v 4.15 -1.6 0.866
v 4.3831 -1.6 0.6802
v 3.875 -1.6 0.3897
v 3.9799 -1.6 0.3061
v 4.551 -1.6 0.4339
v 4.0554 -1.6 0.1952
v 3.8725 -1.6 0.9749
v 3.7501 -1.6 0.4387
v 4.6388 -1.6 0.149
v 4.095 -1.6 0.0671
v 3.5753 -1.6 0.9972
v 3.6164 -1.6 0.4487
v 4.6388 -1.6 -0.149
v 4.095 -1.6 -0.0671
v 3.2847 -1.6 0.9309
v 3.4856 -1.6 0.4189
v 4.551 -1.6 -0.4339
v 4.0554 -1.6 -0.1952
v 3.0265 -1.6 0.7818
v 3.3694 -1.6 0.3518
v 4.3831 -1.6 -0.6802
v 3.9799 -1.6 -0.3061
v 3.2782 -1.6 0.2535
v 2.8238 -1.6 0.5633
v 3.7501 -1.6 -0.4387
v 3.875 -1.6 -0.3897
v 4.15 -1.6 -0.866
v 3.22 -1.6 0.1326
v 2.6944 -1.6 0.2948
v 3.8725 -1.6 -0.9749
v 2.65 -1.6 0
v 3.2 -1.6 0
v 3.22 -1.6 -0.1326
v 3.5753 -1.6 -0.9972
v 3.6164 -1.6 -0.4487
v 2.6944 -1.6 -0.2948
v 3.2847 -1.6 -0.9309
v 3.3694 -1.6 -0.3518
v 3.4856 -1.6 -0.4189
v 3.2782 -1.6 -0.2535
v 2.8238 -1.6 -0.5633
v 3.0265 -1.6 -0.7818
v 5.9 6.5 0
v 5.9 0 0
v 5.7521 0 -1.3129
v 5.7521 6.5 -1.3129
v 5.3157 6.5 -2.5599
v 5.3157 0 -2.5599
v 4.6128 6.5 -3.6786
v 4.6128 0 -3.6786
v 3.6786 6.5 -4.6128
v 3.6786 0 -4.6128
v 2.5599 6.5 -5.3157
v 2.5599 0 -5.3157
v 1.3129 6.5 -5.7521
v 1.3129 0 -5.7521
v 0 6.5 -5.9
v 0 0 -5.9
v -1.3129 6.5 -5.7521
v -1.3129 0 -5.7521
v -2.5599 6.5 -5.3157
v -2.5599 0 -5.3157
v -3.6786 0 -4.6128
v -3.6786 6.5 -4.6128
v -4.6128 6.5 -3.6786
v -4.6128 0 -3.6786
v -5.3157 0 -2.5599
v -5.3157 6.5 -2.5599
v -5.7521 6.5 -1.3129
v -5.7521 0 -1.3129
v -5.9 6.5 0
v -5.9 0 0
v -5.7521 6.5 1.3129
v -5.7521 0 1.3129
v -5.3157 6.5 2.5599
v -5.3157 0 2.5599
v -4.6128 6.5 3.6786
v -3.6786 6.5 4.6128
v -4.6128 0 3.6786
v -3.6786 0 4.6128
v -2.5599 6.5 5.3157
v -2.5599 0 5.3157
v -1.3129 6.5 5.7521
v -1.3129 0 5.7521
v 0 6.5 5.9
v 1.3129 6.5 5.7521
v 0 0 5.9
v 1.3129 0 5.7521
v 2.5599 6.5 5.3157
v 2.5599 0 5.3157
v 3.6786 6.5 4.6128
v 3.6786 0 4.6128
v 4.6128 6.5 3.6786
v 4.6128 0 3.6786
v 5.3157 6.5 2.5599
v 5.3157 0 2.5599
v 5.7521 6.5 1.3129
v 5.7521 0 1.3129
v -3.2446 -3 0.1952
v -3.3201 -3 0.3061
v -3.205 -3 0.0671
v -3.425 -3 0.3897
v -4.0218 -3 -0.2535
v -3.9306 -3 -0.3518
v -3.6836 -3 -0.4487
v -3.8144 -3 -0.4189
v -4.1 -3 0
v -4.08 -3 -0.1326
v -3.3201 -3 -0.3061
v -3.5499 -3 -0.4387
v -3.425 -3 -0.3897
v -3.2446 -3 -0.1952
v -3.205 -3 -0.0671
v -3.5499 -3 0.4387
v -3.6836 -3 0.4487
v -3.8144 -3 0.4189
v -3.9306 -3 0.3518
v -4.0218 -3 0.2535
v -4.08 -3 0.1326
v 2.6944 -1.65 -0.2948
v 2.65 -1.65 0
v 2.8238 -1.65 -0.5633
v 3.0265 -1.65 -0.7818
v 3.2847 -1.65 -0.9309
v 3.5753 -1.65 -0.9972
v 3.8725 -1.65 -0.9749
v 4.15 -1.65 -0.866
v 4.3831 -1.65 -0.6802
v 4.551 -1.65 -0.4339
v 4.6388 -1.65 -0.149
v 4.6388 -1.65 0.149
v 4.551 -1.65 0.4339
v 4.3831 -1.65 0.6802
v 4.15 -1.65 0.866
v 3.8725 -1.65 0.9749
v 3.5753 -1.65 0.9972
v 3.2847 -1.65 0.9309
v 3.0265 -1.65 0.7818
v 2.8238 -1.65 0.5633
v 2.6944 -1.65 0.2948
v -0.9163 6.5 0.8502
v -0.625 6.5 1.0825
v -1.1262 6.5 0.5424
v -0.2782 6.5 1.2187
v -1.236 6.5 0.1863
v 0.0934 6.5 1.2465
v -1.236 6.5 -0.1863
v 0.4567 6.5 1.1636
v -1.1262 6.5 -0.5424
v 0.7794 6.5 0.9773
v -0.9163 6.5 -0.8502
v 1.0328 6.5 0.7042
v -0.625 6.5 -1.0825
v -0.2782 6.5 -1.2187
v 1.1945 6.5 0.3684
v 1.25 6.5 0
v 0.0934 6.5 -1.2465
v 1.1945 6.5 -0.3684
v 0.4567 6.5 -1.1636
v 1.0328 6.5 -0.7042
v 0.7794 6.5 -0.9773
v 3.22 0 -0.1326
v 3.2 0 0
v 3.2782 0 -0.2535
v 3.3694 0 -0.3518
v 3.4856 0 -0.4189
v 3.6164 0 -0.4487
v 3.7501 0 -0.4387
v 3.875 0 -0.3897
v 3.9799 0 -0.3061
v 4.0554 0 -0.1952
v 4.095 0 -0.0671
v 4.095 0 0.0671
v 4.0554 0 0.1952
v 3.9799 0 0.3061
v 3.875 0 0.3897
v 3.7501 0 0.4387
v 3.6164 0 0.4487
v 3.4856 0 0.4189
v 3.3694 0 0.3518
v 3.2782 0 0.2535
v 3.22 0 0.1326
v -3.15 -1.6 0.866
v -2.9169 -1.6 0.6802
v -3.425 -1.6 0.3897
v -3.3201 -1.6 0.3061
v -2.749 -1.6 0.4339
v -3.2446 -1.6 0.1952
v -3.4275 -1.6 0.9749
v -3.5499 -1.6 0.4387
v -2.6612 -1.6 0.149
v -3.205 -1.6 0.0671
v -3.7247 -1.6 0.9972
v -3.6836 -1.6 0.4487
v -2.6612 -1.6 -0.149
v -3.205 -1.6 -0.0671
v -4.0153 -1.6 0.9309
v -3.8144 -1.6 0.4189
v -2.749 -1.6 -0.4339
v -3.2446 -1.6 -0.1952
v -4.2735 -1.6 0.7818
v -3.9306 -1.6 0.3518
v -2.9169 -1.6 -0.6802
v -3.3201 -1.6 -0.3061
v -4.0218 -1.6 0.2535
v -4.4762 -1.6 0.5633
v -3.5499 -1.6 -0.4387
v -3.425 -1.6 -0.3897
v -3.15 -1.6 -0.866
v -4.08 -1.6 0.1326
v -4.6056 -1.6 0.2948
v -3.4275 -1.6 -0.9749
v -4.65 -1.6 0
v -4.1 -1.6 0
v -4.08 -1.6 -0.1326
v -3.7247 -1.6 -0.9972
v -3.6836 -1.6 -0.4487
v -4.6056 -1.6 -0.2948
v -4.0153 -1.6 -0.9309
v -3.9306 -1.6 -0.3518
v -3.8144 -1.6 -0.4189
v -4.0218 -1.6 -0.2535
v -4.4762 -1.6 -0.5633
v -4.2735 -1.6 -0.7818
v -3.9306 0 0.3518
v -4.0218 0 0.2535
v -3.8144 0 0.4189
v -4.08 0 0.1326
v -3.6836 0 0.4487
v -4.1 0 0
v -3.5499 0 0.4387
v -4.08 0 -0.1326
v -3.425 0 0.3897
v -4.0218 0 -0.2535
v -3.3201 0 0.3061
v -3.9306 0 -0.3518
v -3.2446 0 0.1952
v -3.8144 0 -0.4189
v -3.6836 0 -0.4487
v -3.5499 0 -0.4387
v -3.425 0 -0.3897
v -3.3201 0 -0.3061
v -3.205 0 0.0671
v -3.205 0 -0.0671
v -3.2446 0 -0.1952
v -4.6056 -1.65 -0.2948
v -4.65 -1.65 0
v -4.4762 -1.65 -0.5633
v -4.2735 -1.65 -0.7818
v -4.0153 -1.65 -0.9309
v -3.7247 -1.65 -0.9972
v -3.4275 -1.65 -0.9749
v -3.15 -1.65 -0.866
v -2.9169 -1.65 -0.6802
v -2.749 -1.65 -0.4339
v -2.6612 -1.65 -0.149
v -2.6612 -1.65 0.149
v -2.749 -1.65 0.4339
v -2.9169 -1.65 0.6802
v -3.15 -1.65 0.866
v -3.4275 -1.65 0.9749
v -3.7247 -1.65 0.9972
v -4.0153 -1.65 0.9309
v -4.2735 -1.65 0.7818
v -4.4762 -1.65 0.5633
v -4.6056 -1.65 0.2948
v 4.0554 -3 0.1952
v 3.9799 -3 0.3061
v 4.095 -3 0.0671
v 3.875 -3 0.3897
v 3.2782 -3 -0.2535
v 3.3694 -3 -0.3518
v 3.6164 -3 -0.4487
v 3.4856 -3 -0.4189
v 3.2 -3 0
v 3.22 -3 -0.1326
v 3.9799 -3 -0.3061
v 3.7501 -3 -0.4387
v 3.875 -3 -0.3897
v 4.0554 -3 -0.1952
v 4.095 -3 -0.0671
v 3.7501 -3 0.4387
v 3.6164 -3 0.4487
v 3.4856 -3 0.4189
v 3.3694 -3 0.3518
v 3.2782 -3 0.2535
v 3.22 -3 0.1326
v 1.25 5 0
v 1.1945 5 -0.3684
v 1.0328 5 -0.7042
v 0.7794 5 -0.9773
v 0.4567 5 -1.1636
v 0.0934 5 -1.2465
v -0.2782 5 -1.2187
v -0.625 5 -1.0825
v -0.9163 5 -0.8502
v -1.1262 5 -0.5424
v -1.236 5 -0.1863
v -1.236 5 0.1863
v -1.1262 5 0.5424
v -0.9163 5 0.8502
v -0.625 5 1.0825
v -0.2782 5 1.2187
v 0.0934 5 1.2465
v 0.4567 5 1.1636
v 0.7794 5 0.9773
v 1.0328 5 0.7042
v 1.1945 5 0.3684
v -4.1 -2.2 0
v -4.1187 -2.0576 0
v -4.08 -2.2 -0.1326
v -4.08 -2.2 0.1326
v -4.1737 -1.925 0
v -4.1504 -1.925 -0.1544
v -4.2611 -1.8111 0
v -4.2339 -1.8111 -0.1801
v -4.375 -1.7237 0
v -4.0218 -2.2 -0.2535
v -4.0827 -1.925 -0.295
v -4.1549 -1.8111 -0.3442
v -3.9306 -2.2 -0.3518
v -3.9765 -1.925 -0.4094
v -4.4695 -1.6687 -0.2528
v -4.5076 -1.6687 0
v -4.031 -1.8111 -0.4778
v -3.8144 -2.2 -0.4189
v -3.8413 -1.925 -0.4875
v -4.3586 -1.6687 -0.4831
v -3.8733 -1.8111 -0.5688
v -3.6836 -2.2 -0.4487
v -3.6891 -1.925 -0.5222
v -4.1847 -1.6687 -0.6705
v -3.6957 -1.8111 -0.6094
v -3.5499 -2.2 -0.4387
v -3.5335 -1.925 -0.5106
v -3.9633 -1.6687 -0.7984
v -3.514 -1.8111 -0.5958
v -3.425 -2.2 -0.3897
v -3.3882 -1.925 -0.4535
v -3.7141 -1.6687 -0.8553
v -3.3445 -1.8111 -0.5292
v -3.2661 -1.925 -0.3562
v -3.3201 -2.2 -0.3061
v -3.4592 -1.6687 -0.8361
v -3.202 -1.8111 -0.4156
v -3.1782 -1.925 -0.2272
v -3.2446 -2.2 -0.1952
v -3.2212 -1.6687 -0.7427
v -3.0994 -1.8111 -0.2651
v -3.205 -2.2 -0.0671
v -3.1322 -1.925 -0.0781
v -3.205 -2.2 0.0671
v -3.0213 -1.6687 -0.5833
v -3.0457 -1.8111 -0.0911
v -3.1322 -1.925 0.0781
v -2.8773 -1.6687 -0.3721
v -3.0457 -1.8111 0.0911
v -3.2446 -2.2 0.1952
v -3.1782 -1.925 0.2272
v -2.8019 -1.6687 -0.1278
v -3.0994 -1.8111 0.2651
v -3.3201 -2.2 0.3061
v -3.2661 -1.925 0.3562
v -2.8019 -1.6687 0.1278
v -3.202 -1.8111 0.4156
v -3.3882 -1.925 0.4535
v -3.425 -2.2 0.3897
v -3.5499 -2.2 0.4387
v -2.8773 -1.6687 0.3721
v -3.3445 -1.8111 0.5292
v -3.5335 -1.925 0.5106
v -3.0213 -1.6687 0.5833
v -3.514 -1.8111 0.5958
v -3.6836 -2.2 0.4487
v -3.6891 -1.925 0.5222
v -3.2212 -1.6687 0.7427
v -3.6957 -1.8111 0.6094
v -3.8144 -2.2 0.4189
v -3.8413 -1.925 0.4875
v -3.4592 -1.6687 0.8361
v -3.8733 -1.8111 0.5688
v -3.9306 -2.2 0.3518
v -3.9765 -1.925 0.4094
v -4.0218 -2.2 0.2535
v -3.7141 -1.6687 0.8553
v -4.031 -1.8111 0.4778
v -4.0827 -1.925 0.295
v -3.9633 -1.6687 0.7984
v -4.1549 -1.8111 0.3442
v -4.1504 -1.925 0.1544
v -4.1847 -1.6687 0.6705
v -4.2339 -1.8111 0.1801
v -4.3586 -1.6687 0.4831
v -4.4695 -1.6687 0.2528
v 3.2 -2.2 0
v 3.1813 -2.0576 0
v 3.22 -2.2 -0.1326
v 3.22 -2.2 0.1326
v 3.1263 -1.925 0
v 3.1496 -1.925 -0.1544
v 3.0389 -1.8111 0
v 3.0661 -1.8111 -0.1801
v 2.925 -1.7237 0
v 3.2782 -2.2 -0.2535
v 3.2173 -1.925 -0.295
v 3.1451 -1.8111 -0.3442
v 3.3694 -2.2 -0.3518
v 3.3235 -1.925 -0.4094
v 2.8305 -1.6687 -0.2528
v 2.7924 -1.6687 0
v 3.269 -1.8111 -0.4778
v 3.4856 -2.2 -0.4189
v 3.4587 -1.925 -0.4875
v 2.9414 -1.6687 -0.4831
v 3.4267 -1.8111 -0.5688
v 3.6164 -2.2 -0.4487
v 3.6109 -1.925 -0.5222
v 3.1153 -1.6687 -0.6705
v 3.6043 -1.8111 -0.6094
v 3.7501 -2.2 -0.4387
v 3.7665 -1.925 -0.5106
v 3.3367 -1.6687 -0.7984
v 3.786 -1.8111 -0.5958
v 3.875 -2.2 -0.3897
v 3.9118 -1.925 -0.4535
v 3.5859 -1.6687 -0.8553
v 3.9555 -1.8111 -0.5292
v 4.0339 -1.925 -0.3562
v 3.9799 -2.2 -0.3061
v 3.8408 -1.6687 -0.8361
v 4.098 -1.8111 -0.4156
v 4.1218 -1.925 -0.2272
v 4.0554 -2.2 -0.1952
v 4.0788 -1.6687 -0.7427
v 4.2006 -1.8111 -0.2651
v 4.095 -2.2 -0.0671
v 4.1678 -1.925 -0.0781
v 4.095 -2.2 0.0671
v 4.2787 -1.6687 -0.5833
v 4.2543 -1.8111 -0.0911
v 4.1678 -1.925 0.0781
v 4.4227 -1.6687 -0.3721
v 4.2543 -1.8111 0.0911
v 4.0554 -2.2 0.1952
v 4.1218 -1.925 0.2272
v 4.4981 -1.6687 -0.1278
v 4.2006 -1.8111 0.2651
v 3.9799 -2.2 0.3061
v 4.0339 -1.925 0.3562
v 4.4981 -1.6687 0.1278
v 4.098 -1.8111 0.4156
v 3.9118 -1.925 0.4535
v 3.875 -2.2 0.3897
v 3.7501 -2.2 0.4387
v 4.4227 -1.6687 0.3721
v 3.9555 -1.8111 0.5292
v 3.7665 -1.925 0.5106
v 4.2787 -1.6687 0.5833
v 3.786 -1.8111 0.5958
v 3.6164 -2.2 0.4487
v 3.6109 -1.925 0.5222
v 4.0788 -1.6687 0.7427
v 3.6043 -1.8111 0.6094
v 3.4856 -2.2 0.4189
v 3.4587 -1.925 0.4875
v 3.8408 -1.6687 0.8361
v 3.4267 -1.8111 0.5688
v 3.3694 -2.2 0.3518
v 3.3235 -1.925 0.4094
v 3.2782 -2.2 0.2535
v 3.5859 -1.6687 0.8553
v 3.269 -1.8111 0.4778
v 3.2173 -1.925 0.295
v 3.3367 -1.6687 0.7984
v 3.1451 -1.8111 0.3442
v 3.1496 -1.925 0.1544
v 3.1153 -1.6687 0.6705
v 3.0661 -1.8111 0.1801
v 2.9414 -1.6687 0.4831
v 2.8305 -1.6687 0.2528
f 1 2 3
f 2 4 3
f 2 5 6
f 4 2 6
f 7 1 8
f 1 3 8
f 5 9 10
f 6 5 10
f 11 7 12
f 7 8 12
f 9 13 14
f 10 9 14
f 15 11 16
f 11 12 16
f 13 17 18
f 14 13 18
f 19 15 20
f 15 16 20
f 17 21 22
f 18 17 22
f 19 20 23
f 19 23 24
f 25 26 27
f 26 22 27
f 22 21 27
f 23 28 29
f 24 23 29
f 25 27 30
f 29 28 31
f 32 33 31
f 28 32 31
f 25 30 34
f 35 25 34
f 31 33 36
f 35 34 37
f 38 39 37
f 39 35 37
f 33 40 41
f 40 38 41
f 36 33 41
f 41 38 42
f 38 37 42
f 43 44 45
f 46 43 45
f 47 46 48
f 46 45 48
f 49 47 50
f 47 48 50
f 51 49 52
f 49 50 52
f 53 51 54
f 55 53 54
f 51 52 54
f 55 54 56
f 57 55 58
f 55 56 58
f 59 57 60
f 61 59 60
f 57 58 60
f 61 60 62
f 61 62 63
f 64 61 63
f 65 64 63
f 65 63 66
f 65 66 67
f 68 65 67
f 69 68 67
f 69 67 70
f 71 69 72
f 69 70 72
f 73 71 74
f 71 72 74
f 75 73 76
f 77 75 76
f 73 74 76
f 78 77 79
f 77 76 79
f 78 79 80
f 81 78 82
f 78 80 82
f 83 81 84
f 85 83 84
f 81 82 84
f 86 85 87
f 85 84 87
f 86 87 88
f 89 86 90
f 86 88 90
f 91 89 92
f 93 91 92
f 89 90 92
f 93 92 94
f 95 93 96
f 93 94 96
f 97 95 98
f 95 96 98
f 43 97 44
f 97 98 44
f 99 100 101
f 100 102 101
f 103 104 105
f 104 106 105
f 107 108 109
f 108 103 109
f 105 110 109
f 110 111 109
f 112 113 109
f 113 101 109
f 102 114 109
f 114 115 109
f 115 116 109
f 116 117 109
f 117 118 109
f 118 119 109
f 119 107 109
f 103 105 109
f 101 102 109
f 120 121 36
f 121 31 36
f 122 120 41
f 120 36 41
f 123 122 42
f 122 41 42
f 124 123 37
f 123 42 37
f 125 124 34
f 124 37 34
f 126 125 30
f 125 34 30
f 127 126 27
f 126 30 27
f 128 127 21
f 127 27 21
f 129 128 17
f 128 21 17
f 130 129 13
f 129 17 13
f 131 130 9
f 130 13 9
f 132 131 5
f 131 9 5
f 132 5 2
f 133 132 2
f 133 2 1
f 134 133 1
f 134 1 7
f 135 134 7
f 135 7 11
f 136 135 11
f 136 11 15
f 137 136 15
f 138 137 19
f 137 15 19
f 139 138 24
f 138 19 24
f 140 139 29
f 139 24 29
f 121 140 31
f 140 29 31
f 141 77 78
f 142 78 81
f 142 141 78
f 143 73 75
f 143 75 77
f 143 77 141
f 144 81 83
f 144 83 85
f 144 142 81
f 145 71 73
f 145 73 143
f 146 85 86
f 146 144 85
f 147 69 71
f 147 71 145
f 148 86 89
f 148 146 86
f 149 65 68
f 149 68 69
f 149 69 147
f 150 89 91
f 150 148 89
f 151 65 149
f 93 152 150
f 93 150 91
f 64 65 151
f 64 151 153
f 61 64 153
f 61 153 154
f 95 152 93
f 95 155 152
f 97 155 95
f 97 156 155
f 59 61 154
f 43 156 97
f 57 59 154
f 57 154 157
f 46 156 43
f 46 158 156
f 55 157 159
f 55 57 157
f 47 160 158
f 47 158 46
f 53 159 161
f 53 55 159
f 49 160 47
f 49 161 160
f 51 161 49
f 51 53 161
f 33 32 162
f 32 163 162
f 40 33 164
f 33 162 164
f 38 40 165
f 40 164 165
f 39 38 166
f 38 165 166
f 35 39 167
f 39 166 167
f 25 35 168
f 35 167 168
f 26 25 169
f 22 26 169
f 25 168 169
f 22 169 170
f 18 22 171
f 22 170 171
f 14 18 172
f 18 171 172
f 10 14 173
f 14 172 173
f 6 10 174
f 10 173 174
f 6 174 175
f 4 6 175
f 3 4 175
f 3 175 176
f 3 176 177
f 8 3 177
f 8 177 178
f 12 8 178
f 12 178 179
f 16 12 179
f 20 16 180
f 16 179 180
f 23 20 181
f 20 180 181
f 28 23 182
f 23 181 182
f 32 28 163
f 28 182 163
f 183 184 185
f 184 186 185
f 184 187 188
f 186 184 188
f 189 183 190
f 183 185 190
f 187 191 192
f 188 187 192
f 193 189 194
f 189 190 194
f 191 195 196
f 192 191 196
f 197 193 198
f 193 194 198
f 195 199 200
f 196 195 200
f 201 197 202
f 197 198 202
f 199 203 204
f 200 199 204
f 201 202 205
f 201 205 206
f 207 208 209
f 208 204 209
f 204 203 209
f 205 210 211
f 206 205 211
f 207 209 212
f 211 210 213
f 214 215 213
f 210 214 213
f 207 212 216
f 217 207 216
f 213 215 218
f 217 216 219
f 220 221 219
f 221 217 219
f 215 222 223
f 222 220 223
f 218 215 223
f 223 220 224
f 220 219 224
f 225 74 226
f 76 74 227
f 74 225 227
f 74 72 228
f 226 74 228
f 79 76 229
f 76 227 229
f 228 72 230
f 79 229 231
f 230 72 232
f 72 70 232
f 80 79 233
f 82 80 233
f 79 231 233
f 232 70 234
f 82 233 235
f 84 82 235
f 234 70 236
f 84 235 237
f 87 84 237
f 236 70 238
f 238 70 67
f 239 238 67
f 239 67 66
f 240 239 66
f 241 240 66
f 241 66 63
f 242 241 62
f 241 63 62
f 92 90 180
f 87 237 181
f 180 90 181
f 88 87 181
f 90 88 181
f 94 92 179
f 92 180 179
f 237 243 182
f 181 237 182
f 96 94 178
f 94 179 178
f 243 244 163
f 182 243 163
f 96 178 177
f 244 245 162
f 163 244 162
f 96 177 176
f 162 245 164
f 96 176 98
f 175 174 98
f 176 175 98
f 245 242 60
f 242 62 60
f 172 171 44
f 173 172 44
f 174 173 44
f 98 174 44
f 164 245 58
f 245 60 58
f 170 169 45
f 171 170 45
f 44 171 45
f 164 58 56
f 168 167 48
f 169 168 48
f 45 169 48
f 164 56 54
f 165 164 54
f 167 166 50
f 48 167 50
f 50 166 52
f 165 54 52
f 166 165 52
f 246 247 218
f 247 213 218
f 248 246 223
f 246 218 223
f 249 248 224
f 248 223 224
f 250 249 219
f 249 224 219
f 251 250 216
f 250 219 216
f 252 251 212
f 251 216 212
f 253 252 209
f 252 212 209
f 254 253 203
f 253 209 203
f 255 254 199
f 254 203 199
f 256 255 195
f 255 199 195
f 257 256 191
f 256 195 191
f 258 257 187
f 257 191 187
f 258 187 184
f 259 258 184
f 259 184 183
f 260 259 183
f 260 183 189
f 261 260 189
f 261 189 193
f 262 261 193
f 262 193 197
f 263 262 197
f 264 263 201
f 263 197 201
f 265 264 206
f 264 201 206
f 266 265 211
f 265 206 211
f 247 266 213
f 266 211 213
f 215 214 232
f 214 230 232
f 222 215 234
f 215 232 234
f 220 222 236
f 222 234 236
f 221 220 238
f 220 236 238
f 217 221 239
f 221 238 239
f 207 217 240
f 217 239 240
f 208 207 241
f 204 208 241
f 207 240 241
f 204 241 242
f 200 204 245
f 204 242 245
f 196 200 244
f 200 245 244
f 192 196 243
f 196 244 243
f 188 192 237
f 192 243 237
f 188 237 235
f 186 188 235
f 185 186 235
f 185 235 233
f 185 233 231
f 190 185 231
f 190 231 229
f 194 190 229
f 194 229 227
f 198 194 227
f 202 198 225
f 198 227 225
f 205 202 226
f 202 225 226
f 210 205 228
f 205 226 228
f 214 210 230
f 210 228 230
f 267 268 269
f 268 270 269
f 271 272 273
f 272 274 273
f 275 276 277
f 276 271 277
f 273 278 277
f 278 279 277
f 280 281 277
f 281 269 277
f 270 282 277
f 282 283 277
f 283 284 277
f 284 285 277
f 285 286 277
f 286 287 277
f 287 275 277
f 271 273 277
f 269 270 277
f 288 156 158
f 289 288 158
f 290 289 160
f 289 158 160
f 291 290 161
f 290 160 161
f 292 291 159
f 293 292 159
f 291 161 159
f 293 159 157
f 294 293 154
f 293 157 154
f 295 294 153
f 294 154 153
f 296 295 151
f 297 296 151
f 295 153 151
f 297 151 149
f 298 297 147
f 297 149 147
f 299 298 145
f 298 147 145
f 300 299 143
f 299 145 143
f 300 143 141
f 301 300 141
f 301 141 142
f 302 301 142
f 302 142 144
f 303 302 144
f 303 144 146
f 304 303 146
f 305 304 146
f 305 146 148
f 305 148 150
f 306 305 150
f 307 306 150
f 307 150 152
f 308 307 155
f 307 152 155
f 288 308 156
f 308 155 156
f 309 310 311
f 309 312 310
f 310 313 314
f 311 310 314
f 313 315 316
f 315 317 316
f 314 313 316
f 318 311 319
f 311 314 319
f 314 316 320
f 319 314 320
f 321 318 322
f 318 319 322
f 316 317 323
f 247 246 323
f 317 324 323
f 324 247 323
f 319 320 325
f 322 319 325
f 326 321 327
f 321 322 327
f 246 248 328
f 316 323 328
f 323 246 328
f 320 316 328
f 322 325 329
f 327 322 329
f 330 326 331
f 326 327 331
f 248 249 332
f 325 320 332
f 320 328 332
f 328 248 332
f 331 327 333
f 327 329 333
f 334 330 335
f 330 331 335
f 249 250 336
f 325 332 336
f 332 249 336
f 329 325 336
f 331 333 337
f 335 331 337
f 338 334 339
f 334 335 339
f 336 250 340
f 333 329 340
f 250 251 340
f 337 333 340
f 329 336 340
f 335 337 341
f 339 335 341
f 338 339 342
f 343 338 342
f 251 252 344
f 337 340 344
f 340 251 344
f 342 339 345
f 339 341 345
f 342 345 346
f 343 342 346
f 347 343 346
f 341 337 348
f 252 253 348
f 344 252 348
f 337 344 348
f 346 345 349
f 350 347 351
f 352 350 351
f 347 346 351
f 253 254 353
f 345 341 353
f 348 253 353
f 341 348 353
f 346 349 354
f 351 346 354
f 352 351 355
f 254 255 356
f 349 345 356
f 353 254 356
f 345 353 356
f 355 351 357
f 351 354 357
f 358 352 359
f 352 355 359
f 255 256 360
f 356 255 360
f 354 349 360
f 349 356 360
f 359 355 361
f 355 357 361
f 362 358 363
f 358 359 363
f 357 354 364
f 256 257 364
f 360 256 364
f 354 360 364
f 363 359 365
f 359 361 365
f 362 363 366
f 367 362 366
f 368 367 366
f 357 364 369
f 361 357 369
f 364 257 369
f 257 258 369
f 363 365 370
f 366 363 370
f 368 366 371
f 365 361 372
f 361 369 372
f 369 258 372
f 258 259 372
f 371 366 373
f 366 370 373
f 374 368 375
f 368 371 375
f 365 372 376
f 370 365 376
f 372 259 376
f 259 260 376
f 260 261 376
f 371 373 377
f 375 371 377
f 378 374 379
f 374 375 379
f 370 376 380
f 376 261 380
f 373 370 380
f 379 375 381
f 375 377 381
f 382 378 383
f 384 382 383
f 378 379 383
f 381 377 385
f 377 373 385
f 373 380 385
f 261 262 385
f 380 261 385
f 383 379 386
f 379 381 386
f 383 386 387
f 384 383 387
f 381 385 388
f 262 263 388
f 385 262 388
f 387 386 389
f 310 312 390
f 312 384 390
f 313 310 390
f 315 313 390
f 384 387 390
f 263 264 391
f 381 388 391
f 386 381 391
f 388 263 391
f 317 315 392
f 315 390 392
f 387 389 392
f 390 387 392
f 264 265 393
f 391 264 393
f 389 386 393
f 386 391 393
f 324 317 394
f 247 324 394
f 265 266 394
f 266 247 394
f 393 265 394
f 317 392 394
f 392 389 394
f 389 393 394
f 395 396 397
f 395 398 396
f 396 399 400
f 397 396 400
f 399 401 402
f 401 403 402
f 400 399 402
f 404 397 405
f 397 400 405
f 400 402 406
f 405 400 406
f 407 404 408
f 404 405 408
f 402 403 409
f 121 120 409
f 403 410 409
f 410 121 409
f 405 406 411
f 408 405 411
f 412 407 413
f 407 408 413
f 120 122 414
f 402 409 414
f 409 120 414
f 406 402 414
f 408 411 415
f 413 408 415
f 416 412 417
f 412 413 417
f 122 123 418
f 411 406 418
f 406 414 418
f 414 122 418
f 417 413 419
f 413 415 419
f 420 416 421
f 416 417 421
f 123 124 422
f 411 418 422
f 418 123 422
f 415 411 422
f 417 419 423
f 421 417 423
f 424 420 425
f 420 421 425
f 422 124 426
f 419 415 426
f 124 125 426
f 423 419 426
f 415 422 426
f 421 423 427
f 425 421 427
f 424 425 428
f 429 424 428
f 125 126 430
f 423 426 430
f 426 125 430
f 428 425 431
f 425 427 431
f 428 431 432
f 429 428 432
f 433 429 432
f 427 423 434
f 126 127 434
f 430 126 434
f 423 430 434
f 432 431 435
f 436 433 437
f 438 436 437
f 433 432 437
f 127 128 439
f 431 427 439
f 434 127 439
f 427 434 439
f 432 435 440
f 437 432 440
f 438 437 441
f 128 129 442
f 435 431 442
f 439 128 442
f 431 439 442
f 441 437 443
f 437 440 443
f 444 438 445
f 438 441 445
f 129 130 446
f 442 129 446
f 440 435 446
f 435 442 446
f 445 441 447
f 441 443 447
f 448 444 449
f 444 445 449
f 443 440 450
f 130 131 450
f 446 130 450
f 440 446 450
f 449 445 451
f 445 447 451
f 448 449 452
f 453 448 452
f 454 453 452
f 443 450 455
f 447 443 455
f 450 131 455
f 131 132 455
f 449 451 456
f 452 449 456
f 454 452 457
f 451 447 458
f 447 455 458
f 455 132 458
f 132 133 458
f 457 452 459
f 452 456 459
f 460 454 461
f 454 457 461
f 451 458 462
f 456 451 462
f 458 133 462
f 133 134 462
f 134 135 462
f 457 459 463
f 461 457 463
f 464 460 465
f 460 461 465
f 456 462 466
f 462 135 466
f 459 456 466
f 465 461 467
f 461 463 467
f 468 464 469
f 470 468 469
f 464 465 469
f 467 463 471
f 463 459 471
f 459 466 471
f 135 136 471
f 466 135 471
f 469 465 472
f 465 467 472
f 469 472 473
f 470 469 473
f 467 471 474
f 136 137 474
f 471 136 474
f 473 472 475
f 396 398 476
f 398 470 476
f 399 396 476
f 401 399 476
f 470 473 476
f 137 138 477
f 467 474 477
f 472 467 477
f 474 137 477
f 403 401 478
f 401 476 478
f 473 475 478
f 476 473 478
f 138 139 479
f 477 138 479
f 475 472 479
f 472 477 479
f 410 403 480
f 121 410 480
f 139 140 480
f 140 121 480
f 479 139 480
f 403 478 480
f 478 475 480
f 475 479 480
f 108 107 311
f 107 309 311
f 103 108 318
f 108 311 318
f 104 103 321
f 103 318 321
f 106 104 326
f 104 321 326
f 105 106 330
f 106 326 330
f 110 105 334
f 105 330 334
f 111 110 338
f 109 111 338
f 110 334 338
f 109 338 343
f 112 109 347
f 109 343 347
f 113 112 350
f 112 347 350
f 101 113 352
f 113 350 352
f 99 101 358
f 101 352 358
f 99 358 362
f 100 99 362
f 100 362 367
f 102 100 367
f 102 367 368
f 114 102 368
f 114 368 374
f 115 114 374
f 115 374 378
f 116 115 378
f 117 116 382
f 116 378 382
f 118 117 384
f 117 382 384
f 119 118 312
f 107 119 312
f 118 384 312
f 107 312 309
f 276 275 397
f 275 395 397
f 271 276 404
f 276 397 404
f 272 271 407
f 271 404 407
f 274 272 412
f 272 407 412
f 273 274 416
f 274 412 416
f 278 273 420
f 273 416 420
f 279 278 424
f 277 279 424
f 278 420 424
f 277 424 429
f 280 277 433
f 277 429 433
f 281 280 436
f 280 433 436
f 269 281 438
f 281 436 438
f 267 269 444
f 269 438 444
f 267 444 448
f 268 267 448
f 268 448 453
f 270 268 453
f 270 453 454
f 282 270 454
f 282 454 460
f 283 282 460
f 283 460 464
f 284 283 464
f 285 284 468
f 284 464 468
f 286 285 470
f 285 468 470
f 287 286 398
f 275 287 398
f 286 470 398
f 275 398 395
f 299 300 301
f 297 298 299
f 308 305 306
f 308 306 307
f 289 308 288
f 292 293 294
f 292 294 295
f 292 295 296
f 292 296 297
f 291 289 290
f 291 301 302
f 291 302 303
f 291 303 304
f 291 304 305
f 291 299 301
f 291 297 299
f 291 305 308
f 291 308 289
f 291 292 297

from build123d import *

# Parameters (mm, degrees)
ESQUISSE1_R                = 5.9
BOSS_EXTRU_1_DEPTH         = 6.5
ESQUISSE2_R                = 1.25
ENL_V_MAT_EXTRU_1_DEPTH    = 1.5
R_P_TITION_LIN_AIRE1_COUNT = 2
R_P_TITION_LIN_AIRE1_PITCH = 7.3


with BuildPart() as part:
    # Esquisse1 → Boss.-Extru.1 (new body)
    with BuildSketch(Plane(origin=(0, 0, 0), x_dir=(1, 0, 0), z_dir=(0, 1, 0))):
        Circle(ESQUISSE1_R)
    extrude(amount=BOSS_EXTRU_1_DEPTH)

    # Esquisse2 → Enlèv. mat.-Extru.1 (cut)
    with BuildSketch(Plane(origin=(0, 6.5, 0), x_dir=(1, 0, 0), z_dir=(0, 1, 0))):
        Circle(ESQUISSE2_R)
    extrude(amount=-ENL_V_MAT_EXTRU_1_DEPTH, mode=Mode.SUBTRACT)

    # Esquisse4 → Révolution1 (revolve)
    with BuildSketch(Plane.XY):
        with BuildLine():
            Line((-3.65, -3), (-4.1, -3))
            Line((-4.1, -3), (-4.1, -2.2))
            ThreePointArc((-4.1, -2.2), (-4.26109127, -1.81109127), (-4.65, -1.65))
            Line((-4.65, -1.65), (-4.65, -1.6))
            Line((-4.65, -1.6), (-4.1, -1.6))
            Line((-4.1, -1.6), (-4.1, 0))
            Line((-4.1, 0), (-3.65, 0))
            Line((-3.65, 0), (-3.65, -3))
        make_face()
    r_volution1 = revolve(axis=Axis((-3.65, 0, 0), (0, -1, 0)))

    # Répétition linéaire1: Révolution1 ×2
    with Locations(*[(i * R_P_TITION_LIN_AIRE1_PITCH, 0, 0) for i in range(1, R_P_TITION_LIN_AIRE1_COUNT)]):
        add(r_volution1)


solid = part.part
